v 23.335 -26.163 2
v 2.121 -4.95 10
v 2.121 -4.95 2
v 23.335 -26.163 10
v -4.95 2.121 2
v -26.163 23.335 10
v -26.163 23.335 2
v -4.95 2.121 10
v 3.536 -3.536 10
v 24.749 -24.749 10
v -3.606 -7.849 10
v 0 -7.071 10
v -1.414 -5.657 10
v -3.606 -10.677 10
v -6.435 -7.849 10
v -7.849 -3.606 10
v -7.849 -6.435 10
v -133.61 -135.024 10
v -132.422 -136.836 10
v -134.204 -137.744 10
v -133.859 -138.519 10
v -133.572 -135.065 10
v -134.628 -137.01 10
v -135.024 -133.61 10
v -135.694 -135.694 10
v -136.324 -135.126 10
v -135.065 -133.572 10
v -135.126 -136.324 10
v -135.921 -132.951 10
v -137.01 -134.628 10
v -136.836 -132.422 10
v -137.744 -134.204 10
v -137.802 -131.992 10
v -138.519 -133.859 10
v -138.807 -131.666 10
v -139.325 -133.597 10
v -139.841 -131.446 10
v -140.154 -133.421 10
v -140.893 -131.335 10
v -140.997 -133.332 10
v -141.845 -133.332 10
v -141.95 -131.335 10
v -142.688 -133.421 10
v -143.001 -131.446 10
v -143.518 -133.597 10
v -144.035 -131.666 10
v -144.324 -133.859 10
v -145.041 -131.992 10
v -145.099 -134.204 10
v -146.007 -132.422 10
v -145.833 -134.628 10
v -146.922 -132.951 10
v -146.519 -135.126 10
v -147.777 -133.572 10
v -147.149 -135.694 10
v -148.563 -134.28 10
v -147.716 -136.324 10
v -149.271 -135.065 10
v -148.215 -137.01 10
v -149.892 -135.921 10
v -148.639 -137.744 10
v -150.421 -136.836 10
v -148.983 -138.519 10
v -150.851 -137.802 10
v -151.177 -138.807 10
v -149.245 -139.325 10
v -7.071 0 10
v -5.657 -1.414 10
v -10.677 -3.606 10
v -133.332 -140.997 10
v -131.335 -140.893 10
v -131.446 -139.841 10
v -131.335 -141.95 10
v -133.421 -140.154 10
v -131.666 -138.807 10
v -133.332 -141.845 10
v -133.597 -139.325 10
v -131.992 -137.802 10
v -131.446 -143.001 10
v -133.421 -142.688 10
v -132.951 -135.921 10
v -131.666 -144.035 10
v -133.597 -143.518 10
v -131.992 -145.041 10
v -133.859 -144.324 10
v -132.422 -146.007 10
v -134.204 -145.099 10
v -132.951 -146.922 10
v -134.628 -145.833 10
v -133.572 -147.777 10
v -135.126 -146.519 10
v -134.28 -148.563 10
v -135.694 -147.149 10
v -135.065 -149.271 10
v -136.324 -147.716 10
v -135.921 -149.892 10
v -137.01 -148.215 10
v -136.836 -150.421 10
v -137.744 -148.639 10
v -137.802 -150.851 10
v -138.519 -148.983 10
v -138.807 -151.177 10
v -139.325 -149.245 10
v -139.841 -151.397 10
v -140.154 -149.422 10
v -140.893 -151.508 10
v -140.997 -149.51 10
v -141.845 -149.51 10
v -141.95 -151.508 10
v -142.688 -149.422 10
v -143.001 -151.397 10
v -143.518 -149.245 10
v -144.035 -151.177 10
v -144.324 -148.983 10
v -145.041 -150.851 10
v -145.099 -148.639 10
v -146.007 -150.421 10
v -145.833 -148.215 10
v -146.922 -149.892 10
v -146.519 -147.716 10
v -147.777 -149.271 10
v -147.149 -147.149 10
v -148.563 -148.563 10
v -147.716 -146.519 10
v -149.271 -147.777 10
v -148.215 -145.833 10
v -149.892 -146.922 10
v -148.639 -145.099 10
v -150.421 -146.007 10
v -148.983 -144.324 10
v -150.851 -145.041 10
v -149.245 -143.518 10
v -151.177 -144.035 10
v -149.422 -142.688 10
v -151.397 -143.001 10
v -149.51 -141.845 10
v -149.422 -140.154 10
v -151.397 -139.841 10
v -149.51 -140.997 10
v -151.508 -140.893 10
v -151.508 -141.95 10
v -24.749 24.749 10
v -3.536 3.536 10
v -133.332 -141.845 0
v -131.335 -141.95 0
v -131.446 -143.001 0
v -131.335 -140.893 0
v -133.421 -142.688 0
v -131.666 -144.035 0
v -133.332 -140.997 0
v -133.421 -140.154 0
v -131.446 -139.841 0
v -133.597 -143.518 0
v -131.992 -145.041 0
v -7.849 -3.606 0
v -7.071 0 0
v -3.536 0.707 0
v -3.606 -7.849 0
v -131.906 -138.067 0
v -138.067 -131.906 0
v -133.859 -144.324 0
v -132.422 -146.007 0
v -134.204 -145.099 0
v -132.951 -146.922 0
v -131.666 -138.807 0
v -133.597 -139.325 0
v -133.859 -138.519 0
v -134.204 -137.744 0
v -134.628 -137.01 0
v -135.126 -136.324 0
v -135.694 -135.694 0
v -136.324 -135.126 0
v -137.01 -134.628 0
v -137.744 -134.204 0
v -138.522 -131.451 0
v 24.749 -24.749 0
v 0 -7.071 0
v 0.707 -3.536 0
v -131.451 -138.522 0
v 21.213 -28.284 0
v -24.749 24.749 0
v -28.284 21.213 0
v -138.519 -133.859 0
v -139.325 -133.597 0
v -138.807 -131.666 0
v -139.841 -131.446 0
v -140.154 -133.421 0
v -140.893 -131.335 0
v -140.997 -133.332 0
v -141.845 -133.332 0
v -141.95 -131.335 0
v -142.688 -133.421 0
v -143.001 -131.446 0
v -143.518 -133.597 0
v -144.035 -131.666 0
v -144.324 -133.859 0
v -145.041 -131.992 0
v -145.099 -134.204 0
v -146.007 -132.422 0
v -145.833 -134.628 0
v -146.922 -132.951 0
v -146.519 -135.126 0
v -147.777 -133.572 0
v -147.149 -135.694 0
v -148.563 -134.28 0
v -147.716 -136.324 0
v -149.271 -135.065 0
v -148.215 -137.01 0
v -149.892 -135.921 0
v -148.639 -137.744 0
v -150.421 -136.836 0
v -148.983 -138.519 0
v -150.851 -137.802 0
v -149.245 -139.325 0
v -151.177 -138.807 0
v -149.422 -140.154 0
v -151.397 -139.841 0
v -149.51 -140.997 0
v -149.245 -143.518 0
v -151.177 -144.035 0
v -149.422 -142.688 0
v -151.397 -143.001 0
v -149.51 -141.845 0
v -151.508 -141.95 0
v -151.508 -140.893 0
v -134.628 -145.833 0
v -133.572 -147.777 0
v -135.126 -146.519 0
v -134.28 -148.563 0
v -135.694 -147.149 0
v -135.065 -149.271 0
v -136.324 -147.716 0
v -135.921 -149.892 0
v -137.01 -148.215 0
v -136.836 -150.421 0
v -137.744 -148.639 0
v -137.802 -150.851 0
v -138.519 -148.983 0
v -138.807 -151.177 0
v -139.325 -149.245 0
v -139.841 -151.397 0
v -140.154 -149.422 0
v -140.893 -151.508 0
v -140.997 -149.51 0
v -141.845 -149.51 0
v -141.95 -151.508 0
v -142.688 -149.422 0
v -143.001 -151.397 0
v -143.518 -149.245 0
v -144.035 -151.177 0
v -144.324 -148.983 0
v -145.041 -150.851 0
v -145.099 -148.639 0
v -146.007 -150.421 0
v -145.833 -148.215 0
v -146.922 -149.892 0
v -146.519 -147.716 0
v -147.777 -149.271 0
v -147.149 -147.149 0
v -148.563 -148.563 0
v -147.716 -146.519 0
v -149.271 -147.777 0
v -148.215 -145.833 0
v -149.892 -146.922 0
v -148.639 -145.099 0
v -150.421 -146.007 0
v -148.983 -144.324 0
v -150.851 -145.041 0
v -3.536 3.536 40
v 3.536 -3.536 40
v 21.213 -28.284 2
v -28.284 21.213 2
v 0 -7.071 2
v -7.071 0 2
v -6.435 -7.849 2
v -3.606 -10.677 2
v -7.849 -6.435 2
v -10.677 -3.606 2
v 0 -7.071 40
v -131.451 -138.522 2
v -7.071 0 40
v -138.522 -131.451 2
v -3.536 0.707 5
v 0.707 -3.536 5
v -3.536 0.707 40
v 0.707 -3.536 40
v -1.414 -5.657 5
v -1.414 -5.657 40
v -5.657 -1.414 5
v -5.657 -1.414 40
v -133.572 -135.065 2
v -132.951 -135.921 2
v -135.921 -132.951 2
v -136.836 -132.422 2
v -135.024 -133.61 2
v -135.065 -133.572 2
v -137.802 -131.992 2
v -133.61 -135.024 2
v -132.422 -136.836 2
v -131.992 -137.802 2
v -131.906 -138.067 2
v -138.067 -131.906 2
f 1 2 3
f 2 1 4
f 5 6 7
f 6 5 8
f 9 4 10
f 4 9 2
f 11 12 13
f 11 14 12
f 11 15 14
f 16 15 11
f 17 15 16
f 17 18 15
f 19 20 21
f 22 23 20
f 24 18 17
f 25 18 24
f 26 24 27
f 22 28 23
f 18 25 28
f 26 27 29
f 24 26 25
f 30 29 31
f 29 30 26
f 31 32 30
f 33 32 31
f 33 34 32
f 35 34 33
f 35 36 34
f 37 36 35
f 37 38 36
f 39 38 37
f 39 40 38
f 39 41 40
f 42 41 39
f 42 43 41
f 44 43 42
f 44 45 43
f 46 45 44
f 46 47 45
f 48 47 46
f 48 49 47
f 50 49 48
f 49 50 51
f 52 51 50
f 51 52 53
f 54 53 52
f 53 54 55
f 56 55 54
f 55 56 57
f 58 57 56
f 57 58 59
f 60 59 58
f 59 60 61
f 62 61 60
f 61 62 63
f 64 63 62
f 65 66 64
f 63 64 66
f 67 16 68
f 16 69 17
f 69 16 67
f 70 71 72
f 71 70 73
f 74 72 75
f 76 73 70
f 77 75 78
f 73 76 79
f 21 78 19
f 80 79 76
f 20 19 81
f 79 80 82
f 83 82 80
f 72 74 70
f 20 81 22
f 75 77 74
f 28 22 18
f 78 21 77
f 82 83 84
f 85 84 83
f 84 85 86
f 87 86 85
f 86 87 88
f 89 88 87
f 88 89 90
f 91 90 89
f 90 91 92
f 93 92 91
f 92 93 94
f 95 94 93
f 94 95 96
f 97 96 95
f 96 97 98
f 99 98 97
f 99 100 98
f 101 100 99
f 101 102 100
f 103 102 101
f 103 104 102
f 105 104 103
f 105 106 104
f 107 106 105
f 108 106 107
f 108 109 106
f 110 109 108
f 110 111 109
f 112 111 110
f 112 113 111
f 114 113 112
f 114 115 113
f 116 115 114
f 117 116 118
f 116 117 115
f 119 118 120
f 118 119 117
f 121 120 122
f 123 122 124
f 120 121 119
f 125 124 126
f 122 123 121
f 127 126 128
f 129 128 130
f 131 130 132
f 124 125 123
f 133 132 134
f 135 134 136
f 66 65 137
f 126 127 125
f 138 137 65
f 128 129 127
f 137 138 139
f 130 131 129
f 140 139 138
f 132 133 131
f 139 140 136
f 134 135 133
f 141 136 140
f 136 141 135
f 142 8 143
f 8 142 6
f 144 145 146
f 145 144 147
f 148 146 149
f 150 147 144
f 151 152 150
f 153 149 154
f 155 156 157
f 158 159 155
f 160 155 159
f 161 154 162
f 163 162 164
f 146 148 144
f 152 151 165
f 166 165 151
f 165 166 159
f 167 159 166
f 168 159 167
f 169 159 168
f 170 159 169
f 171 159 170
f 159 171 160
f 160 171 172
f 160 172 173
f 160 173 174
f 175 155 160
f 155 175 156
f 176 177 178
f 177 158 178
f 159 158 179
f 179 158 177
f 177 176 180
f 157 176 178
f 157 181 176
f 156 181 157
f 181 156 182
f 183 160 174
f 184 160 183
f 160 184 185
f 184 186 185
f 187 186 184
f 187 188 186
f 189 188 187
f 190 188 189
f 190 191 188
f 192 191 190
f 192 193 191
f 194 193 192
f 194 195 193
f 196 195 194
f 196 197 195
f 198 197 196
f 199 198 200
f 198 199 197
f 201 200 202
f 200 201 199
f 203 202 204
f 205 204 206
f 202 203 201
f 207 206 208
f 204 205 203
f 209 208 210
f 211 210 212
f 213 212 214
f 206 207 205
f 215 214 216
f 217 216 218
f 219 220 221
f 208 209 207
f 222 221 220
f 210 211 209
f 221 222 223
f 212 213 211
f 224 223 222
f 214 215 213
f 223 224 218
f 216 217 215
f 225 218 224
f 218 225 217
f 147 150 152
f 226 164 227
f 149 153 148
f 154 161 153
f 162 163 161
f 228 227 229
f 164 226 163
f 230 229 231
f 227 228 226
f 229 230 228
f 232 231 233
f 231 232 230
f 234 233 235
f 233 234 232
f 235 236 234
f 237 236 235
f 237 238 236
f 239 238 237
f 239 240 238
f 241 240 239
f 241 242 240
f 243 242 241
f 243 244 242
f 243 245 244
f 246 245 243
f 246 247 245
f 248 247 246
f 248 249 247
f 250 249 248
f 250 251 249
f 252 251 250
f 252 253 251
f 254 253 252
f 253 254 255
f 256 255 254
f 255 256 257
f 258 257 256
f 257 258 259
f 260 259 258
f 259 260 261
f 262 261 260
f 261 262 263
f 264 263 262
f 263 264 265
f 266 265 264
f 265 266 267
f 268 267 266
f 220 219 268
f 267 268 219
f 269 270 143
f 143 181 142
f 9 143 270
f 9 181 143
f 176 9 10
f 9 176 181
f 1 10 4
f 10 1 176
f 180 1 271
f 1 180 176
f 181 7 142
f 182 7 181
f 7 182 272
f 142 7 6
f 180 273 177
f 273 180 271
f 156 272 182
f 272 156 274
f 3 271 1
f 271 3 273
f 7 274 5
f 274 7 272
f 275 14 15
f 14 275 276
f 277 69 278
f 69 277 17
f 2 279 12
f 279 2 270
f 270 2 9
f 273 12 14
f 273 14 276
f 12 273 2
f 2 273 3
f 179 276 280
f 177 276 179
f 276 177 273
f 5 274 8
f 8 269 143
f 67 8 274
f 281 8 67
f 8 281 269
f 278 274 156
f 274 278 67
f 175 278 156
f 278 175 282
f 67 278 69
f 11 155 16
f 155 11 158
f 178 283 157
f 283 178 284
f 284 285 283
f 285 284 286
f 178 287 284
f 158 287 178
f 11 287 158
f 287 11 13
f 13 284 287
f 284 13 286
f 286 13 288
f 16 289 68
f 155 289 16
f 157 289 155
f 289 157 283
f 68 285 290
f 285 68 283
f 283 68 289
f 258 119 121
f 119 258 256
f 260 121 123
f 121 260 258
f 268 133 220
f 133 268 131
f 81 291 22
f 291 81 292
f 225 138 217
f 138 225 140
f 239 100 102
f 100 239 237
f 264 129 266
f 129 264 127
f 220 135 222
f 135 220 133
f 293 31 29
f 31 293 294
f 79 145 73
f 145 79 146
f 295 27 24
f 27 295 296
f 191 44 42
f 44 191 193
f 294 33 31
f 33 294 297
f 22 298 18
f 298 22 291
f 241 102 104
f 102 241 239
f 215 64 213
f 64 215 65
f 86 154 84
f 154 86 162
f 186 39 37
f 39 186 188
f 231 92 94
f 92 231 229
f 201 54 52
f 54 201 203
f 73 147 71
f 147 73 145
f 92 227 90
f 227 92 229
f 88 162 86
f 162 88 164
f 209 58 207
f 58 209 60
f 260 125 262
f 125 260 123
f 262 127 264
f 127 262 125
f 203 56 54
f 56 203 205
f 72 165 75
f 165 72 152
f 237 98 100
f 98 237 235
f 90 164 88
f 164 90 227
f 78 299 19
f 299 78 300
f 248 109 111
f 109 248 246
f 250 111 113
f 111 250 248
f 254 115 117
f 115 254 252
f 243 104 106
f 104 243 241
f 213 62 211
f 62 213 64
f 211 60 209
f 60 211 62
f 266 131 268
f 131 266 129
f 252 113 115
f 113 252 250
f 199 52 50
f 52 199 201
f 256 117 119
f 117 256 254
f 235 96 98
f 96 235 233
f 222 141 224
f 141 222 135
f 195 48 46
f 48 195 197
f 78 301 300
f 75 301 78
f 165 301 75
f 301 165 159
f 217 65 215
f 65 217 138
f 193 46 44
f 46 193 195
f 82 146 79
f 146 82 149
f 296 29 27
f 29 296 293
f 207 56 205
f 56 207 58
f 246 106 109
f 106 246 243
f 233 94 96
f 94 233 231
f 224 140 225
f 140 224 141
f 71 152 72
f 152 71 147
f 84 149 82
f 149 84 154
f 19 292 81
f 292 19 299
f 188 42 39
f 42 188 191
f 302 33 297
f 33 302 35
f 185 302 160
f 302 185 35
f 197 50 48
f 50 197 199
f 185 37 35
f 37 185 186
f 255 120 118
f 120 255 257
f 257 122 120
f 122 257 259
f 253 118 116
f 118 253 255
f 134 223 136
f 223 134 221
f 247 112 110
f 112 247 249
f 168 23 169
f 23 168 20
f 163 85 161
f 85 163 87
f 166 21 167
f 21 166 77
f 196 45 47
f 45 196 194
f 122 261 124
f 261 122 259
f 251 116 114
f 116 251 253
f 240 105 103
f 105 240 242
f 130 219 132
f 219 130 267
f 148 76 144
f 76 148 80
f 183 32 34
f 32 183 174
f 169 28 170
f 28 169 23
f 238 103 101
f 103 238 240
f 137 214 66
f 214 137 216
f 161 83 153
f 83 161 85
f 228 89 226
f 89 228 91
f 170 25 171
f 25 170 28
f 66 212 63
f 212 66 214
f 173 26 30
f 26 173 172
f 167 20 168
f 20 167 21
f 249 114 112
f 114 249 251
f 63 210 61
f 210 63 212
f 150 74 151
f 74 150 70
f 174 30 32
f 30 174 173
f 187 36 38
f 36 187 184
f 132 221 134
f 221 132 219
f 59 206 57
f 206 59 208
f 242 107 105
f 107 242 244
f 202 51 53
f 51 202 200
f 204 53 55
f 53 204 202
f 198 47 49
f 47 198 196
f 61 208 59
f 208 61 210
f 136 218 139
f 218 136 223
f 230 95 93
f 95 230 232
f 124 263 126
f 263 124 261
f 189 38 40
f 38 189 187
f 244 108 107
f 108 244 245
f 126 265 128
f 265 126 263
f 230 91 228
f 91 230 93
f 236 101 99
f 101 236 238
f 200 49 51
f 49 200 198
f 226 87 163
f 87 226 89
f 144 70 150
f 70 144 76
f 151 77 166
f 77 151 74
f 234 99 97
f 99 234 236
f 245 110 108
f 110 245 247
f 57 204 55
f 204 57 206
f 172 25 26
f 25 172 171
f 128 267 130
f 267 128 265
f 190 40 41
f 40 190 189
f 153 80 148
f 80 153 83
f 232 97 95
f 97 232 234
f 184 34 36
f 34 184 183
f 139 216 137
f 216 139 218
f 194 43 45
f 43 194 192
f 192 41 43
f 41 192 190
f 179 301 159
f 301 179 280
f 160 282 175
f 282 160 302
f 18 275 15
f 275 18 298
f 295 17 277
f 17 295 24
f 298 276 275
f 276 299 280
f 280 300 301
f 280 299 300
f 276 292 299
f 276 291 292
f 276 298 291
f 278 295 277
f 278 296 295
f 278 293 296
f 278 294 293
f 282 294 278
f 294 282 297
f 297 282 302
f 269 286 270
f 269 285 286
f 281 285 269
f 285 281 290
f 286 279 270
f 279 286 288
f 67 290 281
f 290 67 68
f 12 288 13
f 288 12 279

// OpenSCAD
//
// Ultrasound test bench
//
// Design by Egil Kvaleberg, 1 February 2015
//
// Now with some extra strengthening of the tower
//
// Note that X and Z are switched. Sorry about that

variant = "tower"; // [demo, tower, pivot, bar]

// wall thickness
wall = 2.0;
// diameter of transducer
sdia = 16.2; 
// height above table
theight = 200.0; 
// width of bar
bwidth = 10.0;
// length of supporting feet
fwidth = 70.0;
// distance horisontally
dlen = 200.0; 
// tolerance for fit 
tol = 0.25; 
// radius of protractor
protractor = 40.0; 

platform = 1*200.0;
d = 1*0.03;

//color("Green") cube([platform, platform, 0.1], center=true);


module tower() {
	// main pillar
	translate([theight/2, 0, bwidth/2]) cube([theight-sdia-wall, wall, bwidth], center=true);
	translate([theight/2, 0, wall/2]) cube([theight-sdia-wall, bwidth, wall], center=true);

	translate([0, 0, bwidth/2]) difference(){
		union () {
			// feet across
			translate([wall/2, 0, 0]) cube([wall, fwidth, bwidth], center=true);
			translate([bwidth/2/2, 0, -bwidth/2+wall/2]) cube([bwidth/2, fwidth, wall], center=true);
			translate([wall+sdia/4, 0, 0]) cube([sdia/2, bwidth, bwidth], center=true);
		}
		union () {
			translate([wall+(sdia/2-wall)/2, 0, 0]) cube([sdia/2-wall, bwidth-2*wall, 2*d+bwidth], center=true);
		}
	}
	// foot "upwards"
	translate([wall/2, 0, fwidth/4+bwidth/2]) cube([wall, bwidth, fwidth/2], center=true);
	translate([bwidth/2/2, wall/2-bwidth/2, fwidth/4+bwidth/2]) cube([bwidth/2, wall, fwidth/2], center=true);
	translate([bwidth/2/2, bwidth/2-wall/2, fwidth/4+bwidth/2]) cube([bwidth/2, wall, fwidth/2], center=true);
	// ring on top
	translate([theight, 0, 0]) difference () {
		cylinder(r=sdia/2+wall, h=bwidth, $fn=60);
		translate([0, 0, -d]) cylinder(r=sdia/2, h=bwidth+2*d, $fn=60);
	}
}

module connector (len) {
	translate([0, 0, bwidth/2])
			translate([wall+(sdia/2-wall)/2, 0, 0]) cube([sdia/2-wall-2*tol, bwidth-2*wall-2*tol, bwidth+2*tol], center=true);
	translate([bwidth/2, 0, -tol-(bwidth/2)/2]) cube([bwidth, bwidth, bwidth/2], center=true);
	translate([wall/2, 0, -tol-(len-tol)/2]) cube([wall, bwidth, len-tol], center=true);
}


module pivot() {
	connector(1.1*bwidth);
	translate([0, 0, -1.1*bwidth]) rotate([0,90,0]) {
		difference () { 
			intersection () {
				cylinder(r = protractor, h=wall, $fn=60);
				translate([protractor/2, 0, wall/2]) cube([protractor, 2*protractor, wall], center=true);
			}
			for (r = [-90:5:90]) 
			rotate([0, 0, r]) translate([protractor-2.0, 0, -d]) cylinder(r = 1.2, h=wall+2*d, $fn=10);
			for (r = [-90:15:90]) 
			rotate([0, 0, r]) translate([protractor-5.0, 0, -d]) cylinder(r = 1.2, h=wall+2*d, $fn=10);
		}
	}
	translate([0, 0, -1.1*bwidth]) rotate([0,90,0]) cylinder(r = bwidth/4-tol/2, h=3*wall, $fn=20);
}

module bar() {
	difference () {
		union () {
			connector(dlen-protractor-bwidth*1.1-tol);
			translate([wall+tol/2, 0, protractor-dlen+1.6*bwidth+tol]) cube([wall+tol+wall, bwidth, 1.0*bwidth], center=true);
			translate([wall/2+wall+tol, 0, protractor-dlen-0.4*bwidth]) cube([wall, bwidth, protractor+1*bwidth], center=true);
			translate([wall+tol, 0, 1.1*bwidth-dlen]) rotate([0,90,0]) cylinder(r=bwidth/2, h=wall);
		}
		union () {
			// axle
			translate([0, 0, 1.1*bwidth-dlen]) rotate([0,90,0]) cylinder(r = bwidth/4+tol/2, h=2*wall+tol+d, $fn=20);
			// observation hole 
			translate([0, 0, protractor+0.8*bwidth-dlen]) rotate([0,90,0]) cylinder(r = bwidth/4, h=2*wall+tol+d, $fn=20);
			translate([0, 0, protractor+0.4*bwidth-dlen]) rotate([0,90,0]) cylinder(r = 1.2, h=2*wall+tol+d, $fn=20);
		}
	}
}

if (variant == "tower") rotate([0, 0, 180+45]) tower();
if (variant == "bar") rotate([0, -90, 45]) bar();
if (variant == "pivot") rotate([0, -90, 0]) pivot();
if (variant == "demo") rotate([0, -90, 0]) {
	tower();
	color("Green") bar();	 
	rotate([180, 0, 0]) translate([0, 0, dlen]) {
		color("Blue") pivot();
		tower();
	}
}
